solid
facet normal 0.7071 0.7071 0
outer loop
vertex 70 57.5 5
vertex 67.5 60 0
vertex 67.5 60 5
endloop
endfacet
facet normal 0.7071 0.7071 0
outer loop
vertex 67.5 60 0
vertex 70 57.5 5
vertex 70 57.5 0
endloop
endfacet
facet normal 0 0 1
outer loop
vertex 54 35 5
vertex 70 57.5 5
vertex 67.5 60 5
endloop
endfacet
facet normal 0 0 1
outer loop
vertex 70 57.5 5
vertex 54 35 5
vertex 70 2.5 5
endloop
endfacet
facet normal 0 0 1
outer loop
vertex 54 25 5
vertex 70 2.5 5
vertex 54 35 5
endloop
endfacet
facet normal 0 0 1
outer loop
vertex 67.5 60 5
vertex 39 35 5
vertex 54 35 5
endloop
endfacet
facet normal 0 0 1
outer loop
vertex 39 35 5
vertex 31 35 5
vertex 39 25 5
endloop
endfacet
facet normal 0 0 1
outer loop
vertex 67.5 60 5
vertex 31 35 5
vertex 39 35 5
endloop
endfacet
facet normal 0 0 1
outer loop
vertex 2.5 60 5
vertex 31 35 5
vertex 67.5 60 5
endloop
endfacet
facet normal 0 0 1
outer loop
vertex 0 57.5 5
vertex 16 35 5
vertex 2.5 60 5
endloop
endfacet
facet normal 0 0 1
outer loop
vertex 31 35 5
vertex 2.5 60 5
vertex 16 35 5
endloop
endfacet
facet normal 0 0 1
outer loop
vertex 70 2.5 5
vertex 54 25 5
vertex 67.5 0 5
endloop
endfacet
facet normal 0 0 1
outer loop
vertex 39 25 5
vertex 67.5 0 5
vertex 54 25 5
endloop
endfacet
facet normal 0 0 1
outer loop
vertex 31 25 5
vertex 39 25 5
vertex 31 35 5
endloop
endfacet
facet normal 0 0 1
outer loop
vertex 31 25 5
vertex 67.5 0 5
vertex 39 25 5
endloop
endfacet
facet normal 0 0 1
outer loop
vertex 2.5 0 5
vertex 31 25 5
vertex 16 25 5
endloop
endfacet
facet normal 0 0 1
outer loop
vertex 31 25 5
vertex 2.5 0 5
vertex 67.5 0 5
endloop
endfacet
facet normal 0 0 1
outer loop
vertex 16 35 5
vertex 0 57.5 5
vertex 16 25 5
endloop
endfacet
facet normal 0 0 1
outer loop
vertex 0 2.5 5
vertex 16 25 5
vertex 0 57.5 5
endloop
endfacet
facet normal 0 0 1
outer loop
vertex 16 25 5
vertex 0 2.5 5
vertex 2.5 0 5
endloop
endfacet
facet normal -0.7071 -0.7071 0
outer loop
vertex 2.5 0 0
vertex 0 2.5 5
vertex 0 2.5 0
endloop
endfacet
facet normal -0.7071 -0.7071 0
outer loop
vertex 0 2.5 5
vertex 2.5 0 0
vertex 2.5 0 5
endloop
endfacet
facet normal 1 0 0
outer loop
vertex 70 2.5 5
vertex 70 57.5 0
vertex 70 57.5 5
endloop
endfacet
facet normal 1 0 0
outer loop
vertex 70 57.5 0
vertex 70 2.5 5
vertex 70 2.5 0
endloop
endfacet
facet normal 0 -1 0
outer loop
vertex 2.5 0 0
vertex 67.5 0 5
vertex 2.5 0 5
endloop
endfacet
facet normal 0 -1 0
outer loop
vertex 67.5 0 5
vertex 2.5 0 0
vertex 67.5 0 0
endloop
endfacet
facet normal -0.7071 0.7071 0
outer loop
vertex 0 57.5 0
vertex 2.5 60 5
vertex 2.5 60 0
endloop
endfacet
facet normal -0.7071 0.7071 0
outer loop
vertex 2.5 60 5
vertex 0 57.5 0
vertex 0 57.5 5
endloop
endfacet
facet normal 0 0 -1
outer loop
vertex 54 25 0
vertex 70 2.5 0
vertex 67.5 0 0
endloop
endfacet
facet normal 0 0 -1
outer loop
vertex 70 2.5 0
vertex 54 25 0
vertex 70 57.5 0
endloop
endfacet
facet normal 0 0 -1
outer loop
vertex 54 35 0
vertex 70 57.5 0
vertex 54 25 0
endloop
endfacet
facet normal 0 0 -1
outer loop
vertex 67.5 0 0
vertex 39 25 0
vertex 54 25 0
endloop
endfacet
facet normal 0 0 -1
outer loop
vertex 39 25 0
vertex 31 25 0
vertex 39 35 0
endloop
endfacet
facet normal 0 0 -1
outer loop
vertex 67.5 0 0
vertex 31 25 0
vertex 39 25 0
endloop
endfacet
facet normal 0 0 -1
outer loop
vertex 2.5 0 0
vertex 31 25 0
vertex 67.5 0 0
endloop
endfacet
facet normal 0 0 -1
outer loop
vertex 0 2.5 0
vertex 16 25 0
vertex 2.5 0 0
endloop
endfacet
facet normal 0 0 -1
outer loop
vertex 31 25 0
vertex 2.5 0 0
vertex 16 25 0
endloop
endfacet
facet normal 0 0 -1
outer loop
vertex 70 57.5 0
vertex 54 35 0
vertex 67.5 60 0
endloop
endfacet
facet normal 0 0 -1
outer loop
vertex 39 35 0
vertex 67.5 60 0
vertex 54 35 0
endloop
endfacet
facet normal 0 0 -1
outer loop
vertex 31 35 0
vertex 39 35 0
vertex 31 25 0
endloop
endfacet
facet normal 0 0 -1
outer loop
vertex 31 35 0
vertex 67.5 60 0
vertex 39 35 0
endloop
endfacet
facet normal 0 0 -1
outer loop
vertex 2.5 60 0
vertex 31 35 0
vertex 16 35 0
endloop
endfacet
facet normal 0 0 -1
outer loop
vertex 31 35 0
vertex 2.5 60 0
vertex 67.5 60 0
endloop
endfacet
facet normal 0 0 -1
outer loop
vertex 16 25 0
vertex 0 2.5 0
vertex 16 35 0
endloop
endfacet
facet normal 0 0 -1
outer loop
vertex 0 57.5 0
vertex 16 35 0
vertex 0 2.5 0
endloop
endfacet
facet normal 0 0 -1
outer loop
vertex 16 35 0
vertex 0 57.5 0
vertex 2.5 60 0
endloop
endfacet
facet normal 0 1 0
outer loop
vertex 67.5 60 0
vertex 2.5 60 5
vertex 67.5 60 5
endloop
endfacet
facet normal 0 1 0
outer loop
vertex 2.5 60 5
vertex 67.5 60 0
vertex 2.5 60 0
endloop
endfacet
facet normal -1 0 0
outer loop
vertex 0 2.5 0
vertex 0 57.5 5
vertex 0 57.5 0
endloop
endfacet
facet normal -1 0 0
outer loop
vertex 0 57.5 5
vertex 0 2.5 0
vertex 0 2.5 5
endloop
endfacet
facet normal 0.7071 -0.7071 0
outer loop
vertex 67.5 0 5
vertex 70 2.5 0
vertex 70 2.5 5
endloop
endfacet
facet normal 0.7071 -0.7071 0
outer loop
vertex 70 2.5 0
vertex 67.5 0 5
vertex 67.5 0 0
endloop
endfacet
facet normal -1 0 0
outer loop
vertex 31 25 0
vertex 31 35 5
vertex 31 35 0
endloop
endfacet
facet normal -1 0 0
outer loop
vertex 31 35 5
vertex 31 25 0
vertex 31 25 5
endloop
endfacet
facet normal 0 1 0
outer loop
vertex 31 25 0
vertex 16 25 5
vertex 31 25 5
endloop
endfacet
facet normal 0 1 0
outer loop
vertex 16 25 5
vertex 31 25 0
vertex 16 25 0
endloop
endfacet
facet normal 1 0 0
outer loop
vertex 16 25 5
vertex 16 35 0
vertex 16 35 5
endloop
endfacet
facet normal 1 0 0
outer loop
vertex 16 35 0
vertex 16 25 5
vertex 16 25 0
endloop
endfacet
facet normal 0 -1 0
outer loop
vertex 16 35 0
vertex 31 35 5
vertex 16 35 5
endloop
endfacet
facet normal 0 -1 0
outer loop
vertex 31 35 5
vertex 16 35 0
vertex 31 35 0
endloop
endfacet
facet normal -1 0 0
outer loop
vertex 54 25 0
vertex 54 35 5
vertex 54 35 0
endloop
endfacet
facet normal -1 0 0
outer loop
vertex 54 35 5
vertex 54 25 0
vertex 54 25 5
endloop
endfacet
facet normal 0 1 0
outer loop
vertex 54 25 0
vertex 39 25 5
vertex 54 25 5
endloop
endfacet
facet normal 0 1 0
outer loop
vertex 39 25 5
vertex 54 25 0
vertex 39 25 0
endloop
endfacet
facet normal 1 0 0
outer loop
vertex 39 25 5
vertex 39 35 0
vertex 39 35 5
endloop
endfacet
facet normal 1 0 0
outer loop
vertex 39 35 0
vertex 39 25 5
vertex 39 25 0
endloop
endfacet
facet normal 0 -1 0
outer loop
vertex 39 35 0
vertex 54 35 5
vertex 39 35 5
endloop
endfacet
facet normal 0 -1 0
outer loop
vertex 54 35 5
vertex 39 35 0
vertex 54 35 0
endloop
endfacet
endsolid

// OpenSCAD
$fn = 32;

// ----------------------------------------------------------------------
// Windowed plate: 2 voids, 70 x 60 x 5 mm
// ----------------------------------------------------------------------

// --- parameters (mm) ---
plate_l = 70;             // plate length, X
plate_w = 60;             // plate width, Y
plate_t = 5;              // plate thickness, Z
edge_margin = 12;         // wall from the plate edge to any window
windows = 2;              // number of windows in the row
win_l = 15;               // window length
win_w = 10;               // window width
win_pitch = 23;           // window pitch along X
depth_1 = 5;              // depth of void 1 (full thickness = through)
depth_2 = 5;              // depth of void 2 (full thickness = through)
corner_c = 2.5;           // corner chamfer of the plate
fit_tol = 0.05;           // declared fit tolerance (prompt contract)
free_tol = 0.2;           // declared free tolerance (prompt contract)

profile = [[2.5, 0], [67.5, 0], [70, 2.5], [70, 57.5], [67.5, 60], [2.5, 60], [0, 57.5], [0, 2.5]];  // primary outline, 8 points, counter clockwise
void_1 = [[16, 25], [31, 25], [31, 35], [16, 35]];  // window 1 of the row, 4 points
void_2 = [[39, 25], [54, 25], [54, 35], [39, 35]];  // window 2 of the row, 4 points

// --- the one profile operation ---
difference() {
  linear_extrude(height = plate_t) polygon(points = profile);
  translate([0, 0, -1])
    linear_extrude(height = plate_t + 2) polygon(points = void_1);
  translate([0, 0, -1])
    linear_extrude(height = plate_t + 2) polygon(points = void_2);
}
